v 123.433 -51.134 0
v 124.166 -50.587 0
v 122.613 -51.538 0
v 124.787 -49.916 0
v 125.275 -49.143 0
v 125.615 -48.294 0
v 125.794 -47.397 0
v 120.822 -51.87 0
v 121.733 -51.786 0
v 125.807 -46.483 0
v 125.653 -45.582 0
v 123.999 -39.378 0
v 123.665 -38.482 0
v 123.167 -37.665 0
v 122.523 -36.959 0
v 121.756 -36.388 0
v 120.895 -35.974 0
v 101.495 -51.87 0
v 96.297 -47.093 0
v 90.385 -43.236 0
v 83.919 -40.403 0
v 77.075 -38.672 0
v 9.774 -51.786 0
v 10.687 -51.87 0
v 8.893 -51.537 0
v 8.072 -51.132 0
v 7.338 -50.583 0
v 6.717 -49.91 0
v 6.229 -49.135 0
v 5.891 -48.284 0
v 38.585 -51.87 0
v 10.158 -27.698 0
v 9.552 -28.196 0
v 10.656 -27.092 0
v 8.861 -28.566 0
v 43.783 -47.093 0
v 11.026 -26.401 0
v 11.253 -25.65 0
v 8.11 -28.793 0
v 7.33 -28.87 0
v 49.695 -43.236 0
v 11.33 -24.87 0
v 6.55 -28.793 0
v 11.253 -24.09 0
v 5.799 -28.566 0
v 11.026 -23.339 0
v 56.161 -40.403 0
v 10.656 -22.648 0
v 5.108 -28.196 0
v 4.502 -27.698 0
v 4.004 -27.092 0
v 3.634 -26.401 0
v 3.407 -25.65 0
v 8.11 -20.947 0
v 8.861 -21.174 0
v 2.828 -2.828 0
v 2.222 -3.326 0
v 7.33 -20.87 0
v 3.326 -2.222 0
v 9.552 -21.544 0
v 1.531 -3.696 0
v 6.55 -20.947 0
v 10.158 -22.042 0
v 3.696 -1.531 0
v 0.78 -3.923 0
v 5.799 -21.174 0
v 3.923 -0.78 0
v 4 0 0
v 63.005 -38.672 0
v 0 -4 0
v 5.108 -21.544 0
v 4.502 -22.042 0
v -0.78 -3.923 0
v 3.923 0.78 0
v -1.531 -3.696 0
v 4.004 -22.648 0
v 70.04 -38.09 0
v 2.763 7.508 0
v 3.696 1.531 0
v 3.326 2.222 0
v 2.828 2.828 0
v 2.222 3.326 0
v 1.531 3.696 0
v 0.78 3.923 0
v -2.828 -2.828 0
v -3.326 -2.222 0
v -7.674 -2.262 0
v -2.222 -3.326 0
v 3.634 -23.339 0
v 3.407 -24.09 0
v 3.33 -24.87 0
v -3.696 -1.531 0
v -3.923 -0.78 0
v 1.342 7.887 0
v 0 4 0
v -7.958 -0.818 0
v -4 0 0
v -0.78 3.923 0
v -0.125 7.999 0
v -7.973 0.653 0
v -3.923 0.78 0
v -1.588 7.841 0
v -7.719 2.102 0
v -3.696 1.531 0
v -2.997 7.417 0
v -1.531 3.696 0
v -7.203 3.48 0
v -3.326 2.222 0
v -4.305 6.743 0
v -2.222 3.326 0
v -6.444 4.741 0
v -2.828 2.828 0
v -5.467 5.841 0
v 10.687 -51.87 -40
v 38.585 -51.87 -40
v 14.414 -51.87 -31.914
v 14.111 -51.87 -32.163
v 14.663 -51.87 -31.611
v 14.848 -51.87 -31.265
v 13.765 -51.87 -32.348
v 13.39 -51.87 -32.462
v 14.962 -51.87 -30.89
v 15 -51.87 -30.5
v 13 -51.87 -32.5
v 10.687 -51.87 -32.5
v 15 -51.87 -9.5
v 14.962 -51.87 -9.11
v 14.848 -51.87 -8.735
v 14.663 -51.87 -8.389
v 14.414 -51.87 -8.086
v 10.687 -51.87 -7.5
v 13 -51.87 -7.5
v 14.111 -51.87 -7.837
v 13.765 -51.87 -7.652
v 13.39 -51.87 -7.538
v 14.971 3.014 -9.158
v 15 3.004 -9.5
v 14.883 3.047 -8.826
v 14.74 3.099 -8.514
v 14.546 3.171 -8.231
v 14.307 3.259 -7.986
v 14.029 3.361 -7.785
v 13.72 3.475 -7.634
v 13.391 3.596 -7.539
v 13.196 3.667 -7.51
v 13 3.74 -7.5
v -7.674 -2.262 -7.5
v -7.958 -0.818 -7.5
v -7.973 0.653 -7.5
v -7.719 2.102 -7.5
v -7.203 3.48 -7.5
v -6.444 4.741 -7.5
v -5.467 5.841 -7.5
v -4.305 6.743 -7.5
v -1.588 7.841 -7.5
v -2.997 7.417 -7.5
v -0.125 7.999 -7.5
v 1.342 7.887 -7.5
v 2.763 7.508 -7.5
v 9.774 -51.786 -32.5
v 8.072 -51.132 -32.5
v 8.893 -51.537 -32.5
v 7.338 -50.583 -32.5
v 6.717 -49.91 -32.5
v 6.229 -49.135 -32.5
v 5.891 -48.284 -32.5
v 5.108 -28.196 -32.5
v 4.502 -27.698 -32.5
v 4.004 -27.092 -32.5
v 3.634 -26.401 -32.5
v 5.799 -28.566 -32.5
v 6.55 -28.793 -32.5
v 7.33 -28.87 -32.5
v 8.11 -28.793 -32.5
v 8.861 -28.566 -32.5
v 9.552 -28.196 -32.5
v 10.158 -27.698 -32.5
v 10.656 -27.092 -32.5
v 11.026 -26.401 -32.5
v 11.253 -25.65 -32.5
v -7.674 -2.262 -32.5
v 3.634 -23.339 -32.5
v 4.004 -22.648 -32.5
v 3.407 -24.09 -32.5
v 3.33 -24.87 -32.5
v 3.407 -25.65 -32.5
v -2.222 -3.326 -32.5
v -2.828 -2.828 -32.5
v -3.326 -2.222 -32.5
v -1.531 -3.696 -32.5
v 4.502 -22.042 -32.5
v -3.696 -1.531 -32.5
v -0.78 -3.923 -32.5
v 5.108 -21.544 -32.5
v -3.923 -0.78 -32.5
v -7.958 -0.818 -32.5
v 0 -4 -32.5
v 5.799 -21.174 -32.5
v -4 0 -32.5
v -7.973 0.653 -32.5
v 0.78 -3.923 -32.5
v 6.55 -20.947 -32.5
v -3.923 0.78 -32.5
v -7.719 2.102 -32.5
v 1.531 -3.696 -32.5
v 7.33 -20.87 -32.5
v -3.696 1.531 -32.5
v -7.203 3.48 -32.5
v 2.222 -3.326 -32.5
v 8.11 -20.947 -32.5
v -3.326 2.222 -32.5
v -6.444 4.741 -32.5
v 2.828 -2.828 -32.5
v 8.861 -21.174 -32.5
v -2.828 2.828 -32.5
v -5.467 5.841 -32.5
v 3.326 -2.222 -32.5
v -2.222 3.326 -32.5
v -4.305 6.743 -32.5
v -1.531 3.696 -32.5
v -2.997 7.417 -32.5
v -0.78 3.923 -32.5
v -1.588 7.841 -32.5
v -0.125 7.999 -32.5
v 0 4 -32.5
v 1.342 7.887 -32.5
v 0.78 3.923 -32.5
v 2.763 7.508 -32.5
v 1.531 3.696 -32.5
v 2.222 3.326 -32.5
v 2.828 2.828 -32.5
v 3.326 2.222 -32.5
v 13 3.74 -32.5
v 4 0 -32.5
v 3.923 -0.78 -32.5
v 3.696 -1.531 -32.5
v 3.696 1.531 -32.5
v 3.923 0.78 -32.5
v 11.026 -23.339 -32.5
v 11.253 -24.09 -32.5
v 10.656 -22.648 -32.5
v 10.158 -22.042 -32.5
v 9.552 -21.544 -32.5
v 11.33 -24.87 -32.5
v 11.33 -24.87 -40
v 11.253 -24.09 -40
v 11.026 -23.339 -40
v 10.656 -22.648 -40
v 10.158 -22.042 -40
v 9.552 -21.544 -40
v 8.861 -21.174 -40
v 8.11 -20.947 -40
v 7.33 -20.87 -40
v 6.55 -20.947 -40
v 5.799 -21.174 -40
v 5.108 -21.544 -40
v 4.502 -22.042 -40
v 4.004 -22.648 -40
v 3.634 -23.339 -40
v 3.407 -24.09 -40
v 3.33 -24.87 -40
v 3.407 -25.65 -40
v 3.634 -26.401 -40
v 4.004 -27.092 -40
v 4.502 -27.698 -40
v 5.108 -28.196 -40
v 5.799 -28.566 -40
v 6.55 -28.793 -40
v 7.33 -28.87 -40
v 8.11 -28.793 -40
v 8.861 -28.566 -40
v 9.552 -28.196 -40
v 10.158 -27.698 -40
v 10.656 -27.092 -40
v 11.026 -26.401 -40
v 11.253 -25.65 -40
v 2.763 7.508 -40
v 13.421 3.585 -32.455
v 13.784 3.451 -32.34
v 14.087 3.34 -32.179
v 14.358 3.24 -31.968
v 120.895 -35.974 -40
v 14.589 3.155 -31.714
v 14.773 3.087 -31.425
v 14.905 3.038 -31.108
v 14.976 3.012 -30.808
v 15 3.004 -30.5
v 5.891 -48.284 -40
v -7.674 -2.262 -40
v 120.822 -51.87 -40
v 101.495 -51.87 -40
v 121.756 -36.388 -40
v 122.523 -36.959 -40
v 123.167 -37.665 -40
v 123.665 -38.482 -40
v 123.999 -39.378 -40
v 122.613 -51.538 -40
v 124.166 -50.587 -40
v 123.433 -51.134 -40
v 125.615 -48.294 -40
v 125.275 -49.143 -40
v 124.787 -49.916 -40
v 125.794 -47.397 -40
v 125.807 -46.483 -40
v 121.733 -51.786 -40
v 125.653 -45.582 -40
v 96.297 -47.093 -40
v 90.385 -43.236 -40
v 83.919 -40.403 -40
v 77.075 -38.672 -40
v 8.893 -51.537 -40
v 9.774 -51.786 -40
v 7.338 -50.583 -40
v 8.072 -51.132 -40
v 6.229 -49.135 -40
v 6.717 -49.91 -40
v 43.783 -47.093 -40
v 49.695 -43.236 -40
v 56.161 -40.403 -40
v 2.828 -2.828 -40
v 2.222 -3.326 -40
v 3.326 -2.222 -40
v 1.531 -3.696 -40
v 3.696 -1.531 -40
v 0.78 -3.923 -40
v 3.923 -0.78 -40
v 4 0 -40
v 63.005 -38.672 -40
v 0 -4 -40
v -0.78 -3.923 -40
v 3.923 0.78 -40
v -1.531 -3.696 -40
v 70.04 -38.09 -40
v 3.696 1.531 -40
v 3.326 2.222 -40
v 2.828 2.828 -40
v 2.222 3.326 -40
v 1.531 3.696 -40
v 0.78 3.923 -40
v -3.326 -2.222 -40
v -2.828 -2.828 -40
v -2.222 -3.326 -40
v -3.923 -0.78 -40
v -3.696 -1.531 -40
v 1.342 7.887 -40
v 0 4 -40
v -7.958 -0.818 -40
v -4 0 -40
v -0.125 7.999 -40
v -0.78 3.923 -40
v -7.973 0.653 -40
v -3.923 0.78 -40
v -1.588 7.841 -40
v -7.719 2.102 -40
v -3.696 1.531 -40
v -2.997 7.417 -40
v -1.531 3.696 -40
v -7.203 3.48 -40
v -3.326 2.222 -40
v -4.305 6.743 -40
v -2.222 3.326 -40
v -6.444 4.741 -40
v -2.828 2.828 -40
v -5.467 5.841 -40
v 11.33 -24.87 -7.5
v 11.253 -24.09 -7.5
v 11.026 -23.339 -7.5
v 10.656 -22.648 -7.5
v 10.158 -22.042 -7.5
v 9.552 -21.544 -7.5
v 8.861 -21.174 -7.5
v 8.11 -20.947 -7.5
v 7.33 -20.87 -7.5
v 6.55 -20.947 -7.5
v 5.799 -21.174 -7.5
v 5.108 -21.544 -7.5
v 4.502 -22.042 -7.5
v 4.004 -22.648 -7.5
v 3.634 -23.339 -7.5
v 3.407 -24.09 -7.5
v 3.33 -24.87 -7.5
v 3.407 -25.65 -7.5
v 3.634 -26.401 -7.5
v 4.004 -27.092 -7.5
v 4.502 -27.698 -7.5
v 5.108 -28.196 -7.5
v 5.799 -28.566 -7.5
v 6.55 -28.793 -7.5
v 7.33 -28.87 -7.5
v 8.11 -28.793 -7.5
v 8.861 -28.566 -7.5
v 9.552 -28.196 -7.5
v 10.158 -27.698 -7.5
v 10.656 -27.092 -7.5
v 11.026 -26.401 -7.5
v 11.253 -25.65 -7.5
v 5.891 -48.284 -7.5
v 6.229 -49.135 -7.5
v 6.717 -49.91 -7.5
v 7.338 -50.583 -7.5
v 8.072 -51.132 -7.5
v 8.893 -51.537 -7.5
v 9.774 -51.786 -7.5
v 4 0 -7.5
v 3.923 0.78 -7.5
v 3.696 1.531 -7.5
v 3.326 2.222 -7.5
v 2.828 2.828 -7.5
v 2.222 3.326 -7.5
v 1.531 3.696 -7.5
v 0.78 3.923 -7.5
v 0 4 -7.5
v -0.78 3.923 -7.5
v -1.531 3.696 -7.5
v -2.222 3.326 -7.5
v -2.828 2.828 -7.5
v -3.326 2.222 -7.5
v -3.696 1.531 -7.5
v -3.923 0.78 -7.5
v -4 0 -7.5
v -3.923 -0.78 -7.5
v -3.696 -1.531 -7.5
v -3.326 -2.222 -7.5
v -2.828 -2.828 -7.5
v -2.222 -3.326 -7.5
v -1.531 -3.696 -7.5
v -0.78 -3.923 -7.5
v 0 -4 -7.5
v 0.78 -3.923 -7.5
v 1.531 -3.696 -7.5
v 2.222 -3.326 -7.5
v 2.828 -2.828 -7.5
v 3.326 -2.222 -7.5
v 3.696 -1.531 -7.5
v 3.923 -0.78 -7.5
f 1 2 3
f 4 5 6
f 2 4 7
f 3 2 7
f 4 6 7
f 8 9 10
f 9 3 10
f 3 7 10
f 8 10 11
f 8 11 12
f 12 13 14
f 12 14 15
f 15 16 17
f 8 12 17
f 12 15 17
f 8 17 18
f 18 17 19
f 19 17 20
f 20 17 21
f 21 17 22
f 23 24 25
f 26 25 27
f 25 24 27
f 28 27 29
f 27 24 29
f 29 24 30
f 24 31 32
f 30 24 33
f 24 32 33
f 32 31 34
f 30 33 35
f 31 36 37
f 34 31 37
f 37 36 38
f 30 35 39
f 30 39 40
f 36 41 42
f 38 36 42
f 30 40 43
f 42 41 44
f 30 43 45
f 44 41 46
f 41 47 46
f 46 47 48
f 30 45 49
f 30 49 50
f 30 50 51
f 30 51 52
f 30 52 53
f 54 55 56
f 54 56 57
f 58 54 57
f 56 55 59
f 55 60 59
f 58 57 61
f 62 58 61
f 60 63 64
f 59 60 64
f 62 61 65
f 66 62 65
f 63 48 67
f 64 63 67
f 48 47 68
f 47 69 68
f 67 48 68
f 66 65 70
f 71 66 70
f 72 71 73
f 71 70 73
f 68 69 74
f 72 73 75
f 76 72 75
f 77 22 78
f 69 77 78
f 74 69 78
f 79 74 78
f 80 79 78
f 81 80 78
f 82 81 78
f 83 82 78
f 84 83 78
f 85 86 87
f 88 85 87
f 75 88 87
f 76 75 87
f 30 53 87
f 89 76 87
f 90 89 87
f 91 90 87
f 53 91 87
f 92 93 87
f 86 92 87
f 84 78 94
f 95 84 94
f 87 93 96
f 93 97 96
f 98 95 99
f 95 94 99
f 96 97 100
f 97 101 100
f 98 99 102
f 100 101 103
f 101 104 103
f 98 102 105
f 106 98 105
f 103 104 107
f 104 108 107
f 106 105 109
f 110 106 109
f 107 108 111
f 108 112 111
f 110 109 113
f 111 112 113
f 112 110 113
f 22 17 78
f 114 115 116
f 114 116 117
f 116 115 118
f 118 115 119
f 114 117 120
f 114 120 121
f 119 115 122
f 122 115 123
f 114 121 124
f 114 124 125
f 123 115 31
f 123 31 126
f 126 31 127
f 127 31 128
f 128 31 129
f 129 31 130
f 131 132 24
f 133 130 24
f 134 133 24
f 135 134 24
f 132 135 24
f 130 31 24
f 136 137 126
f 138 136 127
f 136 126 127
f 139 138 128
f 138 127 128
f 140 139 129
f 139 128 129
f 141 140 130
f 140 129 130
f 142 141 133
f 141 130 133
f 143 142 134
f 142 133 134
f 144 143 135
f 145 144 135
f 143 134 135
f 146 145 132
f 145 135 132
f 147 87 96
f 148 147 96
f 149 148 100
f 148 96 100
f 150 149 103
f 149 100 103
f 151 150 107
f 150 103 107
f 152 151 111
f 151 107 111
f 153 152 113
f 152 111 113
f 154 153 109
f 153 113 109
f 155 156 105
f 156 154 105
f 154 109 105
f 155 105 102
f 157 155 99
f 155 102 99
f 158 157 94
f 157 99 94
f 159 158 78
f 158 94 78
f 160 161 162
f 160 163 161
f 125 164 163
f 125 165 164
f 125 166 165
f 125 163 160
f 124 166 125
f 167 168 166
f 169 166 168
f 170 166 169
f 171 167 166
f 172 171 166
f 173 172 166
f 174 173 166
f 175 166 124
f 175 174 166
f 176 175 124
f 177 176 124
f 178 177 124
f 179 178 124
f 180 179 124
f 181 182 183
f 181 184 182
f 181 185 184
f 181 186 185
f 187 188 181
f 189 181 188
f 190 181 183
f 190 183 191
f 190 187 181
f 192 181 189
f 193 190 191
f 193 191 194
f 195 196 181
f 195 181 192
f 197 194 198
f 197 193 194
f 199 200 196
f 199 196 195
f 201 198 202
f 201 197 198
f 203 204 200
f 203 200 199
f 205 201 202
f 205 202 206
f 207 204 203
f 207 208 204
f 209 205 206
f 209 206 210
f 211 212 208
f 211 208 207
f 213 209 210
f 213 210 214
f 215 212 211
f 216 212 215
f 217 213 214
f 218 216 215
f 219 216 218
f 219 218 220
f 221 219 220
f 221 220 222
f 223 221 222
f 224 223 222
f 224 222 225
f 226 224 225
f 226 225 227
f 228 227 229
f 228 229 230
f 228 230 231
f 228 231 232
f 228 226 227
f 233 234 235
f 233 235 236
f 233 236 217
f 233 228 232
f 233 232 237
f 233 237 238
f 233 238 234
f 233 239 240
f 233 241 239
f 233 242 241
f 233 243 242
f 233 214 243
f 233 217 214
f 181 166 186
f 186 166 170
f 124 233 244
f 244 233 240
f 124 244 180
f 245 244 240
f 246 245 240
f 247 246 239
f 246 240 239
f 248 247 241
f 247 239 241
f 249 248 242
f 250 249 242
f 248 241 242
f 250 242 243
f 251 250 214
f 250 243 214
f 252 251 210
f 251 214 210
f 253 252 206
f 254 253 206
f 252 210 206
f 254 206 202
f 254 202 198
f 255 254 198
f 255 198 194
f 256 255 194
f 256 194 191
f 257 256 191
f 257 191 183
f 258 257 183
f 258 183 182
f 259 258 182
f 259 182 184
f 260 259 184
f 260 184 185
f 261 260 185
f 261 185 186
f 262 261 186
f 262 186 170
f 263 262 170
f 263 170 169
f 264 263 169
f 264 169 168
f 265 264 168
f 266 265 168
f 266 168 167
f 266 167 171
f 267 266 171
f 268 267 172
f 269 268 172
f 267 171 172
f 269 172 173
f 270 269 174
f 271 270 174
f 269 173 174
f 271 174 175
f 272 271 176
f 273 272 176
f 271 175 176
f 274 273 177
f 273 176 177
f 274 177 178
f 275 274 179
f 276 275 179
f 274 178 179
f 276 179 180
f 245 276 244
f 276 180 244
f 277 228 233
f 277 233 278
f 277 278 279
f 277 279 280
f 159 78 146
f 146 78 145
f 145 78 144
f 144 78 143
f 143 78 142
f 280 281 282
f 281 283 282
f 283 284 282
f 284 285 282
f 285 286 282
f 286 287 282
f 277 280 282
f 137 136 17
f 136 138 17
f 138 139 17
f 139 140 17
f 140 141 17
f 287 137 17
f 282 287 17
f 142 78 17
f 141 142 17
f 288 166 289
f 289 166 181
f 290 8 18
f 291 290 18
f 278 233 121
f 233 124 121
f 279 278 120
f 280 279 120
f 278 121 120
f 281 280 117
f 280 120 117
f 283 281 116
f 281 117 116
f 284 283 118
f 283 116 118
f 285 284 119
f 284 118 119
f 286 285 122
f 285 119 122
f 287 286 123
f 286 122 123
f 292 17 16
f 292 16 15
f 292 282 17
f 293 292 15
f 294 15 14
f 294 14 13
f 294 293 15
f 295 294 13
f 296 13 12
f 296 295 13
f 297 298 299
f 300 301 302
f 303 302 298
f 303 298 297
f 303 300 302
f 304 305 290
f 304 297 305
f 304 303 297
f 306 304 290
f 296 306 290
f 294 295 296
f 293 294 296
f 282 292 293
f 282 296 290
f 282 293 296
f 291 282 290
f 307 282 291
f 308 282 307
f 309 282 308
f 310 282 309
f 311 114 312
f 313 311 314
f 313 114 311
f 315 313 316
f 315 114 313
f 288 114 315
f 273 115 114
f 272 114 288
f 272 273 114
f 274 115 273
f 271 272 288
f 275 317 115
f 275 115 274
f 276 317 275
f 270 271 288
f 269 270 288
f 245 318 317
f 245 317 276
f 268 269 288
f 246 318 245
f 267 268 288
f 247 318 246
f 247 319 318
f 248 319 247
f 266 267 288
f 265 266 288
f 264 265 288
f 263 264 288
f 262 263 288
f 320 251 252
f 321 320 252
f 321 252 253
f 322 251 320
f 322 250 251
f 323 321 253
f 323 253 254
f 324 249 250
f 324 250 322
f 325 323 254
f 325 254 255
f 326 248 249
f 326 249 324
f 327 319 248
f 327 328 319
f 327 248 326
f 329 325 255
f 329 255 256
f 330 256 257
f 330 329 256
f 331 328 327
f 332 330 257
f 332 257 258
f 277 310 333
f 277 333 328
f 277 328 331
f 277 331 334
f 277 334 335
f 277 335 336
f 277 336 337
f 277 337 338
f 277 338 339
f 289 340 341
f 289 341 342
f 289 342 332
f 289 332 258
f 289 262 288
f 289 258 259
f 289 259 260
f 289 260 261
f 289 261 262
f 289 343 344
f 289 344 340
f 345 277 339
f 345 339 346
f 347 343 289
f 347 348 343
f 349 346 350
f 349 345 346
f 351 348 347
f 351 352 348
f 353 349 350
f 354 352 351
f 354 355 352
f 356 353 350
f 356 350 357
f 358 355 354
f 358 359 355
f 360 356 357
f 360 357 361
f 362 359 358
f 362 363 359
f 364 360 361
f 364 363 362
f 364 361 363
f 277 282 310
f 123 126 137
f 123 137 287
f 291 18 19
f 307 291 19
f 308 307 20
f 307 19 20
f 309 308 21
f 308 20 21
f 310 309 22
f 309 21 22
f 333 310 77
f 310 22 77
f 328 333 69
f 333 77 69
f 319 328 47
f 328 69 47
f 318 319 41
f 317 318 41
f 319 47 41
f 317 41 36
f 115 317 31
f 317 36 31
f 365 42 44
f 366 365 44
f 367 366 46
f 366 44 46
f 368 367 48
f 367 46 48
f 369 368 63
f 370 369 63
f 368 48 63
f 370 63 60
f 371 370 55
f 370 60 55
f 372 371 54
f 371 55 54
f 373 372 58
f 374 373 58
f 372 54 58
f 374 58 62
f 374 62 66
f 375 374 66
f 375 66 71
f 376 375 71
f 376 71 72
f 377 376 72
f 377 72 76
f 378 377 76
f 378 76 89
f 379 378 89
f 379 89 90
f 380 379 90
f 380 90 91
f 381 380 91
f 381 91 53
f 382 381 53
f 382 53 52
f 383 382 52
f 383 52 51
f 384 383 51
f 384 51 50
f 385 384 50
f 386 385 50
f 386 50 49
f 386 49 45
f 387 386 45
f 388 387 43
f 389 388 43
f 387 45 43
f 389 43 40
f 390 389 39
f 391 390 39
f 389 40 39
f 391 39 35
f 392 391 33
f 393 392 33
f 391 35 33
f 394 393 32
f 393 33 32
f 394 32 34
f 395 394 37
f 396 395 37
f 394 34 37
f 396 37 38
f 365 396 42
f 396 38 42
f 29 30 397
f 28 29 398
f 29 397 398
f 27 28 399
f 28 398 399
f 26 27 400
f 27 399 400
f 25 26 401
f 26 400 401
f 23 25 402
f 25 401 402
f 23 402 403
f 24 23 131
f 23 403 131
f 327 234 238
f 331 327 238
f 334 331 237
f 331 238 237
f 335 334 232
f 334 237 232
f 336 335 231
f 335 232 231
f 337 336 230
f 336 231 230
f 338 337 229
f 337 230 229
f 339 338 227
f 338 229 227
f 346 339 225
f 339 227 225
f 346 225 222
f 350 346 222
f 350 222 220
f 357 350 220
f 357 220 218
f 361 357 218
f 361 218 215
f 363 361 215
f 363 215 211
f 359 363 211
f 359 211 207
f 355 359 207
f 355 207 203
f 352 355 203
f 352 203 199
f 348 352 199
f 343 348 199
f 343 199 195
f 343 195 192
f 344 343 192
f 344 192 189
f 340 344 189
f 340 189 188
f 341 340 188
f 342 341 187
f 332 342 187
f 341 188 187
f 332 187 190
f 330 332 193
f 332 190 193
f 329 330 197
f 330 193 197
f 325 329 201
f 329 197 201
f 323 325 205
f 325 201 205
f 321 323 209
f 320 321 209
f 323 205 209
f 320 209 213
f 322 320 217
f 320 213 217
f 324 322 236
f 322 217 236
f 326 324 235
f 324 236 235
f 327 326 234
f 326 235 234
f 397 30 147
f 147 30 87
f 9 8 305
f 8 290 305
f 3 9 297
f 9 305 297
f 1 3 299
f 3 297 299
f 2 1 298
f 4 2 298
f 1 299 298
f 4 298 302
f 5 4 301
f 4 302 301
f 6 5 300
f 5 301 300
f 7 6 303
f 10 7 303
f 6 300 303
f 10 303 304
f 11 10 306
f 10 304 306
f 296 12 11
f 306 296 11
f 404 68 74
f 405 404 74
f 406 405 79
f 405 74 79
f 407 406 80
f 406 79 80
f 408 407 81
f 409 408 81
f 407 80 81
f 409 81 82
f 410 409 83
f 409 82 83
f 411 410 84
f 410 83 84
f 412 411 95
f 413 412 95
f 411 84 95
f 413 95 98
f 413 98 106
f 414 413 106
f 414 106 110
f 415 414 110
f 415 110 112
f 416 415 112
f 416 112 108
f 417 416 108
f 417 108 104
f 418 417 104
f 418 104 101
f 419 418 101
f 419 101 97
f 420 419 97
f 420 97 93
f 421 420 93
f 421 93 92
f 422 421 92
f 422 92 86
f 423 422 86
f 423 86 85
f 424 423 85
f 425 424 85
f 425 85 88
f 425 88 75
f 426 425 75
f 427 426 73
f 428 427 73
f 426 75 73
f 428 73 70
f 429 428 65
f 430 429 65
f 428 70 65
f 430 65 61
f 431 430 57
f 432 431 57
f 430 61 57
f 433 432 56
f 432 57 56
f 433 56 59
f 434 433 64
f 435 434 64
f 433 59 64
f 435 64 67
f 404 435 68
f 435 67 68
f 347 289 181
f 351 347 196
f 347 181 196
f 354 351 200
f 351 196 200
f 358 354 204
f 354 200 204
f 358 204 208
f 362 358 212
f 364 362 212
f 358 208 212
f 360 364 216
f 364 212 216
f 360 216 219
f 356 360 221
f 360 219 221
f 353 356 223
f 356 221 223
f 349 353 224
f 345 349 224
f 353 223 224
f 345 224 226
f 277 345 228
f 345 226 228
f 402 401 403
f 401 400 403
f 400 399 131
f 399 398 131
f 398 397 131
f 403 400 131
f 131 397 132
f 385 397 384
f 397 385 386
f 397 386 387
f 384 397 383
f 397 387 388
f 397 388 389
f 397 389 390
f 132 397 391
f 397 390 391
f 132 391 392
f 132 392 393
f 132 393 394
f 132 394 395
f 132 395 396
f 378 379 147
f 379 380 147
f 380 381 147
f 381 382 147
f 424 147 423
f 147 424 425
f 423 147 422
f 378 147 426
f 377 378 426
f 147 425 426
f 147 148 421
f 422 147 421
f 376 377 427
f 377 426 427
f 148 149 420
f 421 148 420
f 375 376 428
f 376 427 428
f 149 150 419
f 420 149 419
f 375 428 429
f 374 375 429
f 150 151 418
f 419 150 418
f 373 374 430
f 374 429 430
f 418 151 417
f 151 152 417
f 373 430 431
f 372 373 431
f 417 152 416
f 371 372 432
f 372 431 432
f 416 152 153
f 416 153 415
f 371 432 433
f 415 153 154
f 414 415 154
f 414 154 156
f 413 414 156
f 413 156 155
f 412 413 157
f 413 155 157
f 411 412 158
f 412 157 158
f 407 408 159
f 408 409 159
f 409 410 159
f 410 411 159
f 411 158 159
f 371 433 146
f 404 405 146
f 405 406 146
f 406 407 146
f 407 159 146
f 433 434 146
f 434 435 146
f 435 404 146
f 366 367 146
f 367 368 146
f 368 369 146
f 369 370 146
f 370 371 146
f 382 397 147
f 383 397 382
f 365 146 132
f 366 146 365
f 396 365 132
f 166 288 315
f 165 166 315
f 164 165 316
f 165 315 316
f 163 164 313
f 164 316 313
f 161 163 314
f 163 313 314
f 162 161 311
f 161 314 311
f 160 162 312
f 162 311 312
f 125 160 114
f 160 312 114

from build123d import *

# Parameters (mm, degrees)
SKETCH1_R               = 4
BOSS_EXTRUDE1_DEPTH     = 40
FILLET1_R               = 5
SKETCH2_W               = 25
SKETCH2_H               = 25
CUT_EXTRUDE1_DEPTH      = 9
CUT_EXTRUDE1_DEPTH_BACK = 52.87
FILLET2_R               = 2


with BuildPart() as part:
    # Sketch1 → Boss-Extrude1 (new body)
    with BuildSketch(Plane.XY):
        with BuildLine():
            Line((6.947546174, -51.87), (-7.673645346, -2.261673518))
            ThreePointArc((-7.673645346, -2.261673518), (-5.46693216, 5.840603801), (2.763356291, 7.507586963))
            Line((2.763356291, 7.507586963), (123.33, -36.87))
            Line((123.33, -36.87), (127.33, -51.87))
            Line((127.33, -51.87), (101.494792958, -51.87))
            ThreePointArc((101.494792958, -51.87), (70.04, -38.09), (38.585207042, -51.87))
            Line((38.585207042, -51.87), (6.947546174, -51.87))
        make_face()
        Circle(SKETCH1_R, mode=Mode.SUBTRACT)
        with Locations((7.33, -24.87)):
            Circle(SKETCH1_R, mode=Mode.SUBTRACT)
    extrude(amount=-BOSS_EXTRUDE1_DEPTH)

    # Fillet1
    fillet1_edges = [part.edges().sort_by_distance(p)[0] for p in [
        (6.947546174, -51.87, -20),
        (123.33, -36.87, -20),
        (127.33, -51.87, -20),
    ]]
    fillet(fillet1_edges, radius=FILLET1_R)

    # Sketch2 → Cut-Extrude1 (cut, two sides)
    with BuildSketch(Plane(origin=(0, 0, 0), x_dir=(1, 0, 0), z_dir=(0, 1, 0))) as cut_extrude1_sk:
        with Locations((2.5, 20)):
            Rectangle(SKETCH2_W, SKETCH2_H)
    extrude(amount=CUT_EXTRUDE1_DEPTH, mode=Mode.SUBTRACT)
    extrude(cut_extrude1_sk.sketch, amount=-CUT_EXTRUDE1_DEPTH_BACK, mode=Mode.SUBTRACT)

    # Fillet2
    fillet2_edges = [part.edges().sort_by_distance(p)[0] for p in [
        (15, -24.433208829, -7.5),
        (15, -24.433208829, -32.5),
    ]]
    fillet(fillet2_edges, radius=FILLET2_R)


solid = part.part
